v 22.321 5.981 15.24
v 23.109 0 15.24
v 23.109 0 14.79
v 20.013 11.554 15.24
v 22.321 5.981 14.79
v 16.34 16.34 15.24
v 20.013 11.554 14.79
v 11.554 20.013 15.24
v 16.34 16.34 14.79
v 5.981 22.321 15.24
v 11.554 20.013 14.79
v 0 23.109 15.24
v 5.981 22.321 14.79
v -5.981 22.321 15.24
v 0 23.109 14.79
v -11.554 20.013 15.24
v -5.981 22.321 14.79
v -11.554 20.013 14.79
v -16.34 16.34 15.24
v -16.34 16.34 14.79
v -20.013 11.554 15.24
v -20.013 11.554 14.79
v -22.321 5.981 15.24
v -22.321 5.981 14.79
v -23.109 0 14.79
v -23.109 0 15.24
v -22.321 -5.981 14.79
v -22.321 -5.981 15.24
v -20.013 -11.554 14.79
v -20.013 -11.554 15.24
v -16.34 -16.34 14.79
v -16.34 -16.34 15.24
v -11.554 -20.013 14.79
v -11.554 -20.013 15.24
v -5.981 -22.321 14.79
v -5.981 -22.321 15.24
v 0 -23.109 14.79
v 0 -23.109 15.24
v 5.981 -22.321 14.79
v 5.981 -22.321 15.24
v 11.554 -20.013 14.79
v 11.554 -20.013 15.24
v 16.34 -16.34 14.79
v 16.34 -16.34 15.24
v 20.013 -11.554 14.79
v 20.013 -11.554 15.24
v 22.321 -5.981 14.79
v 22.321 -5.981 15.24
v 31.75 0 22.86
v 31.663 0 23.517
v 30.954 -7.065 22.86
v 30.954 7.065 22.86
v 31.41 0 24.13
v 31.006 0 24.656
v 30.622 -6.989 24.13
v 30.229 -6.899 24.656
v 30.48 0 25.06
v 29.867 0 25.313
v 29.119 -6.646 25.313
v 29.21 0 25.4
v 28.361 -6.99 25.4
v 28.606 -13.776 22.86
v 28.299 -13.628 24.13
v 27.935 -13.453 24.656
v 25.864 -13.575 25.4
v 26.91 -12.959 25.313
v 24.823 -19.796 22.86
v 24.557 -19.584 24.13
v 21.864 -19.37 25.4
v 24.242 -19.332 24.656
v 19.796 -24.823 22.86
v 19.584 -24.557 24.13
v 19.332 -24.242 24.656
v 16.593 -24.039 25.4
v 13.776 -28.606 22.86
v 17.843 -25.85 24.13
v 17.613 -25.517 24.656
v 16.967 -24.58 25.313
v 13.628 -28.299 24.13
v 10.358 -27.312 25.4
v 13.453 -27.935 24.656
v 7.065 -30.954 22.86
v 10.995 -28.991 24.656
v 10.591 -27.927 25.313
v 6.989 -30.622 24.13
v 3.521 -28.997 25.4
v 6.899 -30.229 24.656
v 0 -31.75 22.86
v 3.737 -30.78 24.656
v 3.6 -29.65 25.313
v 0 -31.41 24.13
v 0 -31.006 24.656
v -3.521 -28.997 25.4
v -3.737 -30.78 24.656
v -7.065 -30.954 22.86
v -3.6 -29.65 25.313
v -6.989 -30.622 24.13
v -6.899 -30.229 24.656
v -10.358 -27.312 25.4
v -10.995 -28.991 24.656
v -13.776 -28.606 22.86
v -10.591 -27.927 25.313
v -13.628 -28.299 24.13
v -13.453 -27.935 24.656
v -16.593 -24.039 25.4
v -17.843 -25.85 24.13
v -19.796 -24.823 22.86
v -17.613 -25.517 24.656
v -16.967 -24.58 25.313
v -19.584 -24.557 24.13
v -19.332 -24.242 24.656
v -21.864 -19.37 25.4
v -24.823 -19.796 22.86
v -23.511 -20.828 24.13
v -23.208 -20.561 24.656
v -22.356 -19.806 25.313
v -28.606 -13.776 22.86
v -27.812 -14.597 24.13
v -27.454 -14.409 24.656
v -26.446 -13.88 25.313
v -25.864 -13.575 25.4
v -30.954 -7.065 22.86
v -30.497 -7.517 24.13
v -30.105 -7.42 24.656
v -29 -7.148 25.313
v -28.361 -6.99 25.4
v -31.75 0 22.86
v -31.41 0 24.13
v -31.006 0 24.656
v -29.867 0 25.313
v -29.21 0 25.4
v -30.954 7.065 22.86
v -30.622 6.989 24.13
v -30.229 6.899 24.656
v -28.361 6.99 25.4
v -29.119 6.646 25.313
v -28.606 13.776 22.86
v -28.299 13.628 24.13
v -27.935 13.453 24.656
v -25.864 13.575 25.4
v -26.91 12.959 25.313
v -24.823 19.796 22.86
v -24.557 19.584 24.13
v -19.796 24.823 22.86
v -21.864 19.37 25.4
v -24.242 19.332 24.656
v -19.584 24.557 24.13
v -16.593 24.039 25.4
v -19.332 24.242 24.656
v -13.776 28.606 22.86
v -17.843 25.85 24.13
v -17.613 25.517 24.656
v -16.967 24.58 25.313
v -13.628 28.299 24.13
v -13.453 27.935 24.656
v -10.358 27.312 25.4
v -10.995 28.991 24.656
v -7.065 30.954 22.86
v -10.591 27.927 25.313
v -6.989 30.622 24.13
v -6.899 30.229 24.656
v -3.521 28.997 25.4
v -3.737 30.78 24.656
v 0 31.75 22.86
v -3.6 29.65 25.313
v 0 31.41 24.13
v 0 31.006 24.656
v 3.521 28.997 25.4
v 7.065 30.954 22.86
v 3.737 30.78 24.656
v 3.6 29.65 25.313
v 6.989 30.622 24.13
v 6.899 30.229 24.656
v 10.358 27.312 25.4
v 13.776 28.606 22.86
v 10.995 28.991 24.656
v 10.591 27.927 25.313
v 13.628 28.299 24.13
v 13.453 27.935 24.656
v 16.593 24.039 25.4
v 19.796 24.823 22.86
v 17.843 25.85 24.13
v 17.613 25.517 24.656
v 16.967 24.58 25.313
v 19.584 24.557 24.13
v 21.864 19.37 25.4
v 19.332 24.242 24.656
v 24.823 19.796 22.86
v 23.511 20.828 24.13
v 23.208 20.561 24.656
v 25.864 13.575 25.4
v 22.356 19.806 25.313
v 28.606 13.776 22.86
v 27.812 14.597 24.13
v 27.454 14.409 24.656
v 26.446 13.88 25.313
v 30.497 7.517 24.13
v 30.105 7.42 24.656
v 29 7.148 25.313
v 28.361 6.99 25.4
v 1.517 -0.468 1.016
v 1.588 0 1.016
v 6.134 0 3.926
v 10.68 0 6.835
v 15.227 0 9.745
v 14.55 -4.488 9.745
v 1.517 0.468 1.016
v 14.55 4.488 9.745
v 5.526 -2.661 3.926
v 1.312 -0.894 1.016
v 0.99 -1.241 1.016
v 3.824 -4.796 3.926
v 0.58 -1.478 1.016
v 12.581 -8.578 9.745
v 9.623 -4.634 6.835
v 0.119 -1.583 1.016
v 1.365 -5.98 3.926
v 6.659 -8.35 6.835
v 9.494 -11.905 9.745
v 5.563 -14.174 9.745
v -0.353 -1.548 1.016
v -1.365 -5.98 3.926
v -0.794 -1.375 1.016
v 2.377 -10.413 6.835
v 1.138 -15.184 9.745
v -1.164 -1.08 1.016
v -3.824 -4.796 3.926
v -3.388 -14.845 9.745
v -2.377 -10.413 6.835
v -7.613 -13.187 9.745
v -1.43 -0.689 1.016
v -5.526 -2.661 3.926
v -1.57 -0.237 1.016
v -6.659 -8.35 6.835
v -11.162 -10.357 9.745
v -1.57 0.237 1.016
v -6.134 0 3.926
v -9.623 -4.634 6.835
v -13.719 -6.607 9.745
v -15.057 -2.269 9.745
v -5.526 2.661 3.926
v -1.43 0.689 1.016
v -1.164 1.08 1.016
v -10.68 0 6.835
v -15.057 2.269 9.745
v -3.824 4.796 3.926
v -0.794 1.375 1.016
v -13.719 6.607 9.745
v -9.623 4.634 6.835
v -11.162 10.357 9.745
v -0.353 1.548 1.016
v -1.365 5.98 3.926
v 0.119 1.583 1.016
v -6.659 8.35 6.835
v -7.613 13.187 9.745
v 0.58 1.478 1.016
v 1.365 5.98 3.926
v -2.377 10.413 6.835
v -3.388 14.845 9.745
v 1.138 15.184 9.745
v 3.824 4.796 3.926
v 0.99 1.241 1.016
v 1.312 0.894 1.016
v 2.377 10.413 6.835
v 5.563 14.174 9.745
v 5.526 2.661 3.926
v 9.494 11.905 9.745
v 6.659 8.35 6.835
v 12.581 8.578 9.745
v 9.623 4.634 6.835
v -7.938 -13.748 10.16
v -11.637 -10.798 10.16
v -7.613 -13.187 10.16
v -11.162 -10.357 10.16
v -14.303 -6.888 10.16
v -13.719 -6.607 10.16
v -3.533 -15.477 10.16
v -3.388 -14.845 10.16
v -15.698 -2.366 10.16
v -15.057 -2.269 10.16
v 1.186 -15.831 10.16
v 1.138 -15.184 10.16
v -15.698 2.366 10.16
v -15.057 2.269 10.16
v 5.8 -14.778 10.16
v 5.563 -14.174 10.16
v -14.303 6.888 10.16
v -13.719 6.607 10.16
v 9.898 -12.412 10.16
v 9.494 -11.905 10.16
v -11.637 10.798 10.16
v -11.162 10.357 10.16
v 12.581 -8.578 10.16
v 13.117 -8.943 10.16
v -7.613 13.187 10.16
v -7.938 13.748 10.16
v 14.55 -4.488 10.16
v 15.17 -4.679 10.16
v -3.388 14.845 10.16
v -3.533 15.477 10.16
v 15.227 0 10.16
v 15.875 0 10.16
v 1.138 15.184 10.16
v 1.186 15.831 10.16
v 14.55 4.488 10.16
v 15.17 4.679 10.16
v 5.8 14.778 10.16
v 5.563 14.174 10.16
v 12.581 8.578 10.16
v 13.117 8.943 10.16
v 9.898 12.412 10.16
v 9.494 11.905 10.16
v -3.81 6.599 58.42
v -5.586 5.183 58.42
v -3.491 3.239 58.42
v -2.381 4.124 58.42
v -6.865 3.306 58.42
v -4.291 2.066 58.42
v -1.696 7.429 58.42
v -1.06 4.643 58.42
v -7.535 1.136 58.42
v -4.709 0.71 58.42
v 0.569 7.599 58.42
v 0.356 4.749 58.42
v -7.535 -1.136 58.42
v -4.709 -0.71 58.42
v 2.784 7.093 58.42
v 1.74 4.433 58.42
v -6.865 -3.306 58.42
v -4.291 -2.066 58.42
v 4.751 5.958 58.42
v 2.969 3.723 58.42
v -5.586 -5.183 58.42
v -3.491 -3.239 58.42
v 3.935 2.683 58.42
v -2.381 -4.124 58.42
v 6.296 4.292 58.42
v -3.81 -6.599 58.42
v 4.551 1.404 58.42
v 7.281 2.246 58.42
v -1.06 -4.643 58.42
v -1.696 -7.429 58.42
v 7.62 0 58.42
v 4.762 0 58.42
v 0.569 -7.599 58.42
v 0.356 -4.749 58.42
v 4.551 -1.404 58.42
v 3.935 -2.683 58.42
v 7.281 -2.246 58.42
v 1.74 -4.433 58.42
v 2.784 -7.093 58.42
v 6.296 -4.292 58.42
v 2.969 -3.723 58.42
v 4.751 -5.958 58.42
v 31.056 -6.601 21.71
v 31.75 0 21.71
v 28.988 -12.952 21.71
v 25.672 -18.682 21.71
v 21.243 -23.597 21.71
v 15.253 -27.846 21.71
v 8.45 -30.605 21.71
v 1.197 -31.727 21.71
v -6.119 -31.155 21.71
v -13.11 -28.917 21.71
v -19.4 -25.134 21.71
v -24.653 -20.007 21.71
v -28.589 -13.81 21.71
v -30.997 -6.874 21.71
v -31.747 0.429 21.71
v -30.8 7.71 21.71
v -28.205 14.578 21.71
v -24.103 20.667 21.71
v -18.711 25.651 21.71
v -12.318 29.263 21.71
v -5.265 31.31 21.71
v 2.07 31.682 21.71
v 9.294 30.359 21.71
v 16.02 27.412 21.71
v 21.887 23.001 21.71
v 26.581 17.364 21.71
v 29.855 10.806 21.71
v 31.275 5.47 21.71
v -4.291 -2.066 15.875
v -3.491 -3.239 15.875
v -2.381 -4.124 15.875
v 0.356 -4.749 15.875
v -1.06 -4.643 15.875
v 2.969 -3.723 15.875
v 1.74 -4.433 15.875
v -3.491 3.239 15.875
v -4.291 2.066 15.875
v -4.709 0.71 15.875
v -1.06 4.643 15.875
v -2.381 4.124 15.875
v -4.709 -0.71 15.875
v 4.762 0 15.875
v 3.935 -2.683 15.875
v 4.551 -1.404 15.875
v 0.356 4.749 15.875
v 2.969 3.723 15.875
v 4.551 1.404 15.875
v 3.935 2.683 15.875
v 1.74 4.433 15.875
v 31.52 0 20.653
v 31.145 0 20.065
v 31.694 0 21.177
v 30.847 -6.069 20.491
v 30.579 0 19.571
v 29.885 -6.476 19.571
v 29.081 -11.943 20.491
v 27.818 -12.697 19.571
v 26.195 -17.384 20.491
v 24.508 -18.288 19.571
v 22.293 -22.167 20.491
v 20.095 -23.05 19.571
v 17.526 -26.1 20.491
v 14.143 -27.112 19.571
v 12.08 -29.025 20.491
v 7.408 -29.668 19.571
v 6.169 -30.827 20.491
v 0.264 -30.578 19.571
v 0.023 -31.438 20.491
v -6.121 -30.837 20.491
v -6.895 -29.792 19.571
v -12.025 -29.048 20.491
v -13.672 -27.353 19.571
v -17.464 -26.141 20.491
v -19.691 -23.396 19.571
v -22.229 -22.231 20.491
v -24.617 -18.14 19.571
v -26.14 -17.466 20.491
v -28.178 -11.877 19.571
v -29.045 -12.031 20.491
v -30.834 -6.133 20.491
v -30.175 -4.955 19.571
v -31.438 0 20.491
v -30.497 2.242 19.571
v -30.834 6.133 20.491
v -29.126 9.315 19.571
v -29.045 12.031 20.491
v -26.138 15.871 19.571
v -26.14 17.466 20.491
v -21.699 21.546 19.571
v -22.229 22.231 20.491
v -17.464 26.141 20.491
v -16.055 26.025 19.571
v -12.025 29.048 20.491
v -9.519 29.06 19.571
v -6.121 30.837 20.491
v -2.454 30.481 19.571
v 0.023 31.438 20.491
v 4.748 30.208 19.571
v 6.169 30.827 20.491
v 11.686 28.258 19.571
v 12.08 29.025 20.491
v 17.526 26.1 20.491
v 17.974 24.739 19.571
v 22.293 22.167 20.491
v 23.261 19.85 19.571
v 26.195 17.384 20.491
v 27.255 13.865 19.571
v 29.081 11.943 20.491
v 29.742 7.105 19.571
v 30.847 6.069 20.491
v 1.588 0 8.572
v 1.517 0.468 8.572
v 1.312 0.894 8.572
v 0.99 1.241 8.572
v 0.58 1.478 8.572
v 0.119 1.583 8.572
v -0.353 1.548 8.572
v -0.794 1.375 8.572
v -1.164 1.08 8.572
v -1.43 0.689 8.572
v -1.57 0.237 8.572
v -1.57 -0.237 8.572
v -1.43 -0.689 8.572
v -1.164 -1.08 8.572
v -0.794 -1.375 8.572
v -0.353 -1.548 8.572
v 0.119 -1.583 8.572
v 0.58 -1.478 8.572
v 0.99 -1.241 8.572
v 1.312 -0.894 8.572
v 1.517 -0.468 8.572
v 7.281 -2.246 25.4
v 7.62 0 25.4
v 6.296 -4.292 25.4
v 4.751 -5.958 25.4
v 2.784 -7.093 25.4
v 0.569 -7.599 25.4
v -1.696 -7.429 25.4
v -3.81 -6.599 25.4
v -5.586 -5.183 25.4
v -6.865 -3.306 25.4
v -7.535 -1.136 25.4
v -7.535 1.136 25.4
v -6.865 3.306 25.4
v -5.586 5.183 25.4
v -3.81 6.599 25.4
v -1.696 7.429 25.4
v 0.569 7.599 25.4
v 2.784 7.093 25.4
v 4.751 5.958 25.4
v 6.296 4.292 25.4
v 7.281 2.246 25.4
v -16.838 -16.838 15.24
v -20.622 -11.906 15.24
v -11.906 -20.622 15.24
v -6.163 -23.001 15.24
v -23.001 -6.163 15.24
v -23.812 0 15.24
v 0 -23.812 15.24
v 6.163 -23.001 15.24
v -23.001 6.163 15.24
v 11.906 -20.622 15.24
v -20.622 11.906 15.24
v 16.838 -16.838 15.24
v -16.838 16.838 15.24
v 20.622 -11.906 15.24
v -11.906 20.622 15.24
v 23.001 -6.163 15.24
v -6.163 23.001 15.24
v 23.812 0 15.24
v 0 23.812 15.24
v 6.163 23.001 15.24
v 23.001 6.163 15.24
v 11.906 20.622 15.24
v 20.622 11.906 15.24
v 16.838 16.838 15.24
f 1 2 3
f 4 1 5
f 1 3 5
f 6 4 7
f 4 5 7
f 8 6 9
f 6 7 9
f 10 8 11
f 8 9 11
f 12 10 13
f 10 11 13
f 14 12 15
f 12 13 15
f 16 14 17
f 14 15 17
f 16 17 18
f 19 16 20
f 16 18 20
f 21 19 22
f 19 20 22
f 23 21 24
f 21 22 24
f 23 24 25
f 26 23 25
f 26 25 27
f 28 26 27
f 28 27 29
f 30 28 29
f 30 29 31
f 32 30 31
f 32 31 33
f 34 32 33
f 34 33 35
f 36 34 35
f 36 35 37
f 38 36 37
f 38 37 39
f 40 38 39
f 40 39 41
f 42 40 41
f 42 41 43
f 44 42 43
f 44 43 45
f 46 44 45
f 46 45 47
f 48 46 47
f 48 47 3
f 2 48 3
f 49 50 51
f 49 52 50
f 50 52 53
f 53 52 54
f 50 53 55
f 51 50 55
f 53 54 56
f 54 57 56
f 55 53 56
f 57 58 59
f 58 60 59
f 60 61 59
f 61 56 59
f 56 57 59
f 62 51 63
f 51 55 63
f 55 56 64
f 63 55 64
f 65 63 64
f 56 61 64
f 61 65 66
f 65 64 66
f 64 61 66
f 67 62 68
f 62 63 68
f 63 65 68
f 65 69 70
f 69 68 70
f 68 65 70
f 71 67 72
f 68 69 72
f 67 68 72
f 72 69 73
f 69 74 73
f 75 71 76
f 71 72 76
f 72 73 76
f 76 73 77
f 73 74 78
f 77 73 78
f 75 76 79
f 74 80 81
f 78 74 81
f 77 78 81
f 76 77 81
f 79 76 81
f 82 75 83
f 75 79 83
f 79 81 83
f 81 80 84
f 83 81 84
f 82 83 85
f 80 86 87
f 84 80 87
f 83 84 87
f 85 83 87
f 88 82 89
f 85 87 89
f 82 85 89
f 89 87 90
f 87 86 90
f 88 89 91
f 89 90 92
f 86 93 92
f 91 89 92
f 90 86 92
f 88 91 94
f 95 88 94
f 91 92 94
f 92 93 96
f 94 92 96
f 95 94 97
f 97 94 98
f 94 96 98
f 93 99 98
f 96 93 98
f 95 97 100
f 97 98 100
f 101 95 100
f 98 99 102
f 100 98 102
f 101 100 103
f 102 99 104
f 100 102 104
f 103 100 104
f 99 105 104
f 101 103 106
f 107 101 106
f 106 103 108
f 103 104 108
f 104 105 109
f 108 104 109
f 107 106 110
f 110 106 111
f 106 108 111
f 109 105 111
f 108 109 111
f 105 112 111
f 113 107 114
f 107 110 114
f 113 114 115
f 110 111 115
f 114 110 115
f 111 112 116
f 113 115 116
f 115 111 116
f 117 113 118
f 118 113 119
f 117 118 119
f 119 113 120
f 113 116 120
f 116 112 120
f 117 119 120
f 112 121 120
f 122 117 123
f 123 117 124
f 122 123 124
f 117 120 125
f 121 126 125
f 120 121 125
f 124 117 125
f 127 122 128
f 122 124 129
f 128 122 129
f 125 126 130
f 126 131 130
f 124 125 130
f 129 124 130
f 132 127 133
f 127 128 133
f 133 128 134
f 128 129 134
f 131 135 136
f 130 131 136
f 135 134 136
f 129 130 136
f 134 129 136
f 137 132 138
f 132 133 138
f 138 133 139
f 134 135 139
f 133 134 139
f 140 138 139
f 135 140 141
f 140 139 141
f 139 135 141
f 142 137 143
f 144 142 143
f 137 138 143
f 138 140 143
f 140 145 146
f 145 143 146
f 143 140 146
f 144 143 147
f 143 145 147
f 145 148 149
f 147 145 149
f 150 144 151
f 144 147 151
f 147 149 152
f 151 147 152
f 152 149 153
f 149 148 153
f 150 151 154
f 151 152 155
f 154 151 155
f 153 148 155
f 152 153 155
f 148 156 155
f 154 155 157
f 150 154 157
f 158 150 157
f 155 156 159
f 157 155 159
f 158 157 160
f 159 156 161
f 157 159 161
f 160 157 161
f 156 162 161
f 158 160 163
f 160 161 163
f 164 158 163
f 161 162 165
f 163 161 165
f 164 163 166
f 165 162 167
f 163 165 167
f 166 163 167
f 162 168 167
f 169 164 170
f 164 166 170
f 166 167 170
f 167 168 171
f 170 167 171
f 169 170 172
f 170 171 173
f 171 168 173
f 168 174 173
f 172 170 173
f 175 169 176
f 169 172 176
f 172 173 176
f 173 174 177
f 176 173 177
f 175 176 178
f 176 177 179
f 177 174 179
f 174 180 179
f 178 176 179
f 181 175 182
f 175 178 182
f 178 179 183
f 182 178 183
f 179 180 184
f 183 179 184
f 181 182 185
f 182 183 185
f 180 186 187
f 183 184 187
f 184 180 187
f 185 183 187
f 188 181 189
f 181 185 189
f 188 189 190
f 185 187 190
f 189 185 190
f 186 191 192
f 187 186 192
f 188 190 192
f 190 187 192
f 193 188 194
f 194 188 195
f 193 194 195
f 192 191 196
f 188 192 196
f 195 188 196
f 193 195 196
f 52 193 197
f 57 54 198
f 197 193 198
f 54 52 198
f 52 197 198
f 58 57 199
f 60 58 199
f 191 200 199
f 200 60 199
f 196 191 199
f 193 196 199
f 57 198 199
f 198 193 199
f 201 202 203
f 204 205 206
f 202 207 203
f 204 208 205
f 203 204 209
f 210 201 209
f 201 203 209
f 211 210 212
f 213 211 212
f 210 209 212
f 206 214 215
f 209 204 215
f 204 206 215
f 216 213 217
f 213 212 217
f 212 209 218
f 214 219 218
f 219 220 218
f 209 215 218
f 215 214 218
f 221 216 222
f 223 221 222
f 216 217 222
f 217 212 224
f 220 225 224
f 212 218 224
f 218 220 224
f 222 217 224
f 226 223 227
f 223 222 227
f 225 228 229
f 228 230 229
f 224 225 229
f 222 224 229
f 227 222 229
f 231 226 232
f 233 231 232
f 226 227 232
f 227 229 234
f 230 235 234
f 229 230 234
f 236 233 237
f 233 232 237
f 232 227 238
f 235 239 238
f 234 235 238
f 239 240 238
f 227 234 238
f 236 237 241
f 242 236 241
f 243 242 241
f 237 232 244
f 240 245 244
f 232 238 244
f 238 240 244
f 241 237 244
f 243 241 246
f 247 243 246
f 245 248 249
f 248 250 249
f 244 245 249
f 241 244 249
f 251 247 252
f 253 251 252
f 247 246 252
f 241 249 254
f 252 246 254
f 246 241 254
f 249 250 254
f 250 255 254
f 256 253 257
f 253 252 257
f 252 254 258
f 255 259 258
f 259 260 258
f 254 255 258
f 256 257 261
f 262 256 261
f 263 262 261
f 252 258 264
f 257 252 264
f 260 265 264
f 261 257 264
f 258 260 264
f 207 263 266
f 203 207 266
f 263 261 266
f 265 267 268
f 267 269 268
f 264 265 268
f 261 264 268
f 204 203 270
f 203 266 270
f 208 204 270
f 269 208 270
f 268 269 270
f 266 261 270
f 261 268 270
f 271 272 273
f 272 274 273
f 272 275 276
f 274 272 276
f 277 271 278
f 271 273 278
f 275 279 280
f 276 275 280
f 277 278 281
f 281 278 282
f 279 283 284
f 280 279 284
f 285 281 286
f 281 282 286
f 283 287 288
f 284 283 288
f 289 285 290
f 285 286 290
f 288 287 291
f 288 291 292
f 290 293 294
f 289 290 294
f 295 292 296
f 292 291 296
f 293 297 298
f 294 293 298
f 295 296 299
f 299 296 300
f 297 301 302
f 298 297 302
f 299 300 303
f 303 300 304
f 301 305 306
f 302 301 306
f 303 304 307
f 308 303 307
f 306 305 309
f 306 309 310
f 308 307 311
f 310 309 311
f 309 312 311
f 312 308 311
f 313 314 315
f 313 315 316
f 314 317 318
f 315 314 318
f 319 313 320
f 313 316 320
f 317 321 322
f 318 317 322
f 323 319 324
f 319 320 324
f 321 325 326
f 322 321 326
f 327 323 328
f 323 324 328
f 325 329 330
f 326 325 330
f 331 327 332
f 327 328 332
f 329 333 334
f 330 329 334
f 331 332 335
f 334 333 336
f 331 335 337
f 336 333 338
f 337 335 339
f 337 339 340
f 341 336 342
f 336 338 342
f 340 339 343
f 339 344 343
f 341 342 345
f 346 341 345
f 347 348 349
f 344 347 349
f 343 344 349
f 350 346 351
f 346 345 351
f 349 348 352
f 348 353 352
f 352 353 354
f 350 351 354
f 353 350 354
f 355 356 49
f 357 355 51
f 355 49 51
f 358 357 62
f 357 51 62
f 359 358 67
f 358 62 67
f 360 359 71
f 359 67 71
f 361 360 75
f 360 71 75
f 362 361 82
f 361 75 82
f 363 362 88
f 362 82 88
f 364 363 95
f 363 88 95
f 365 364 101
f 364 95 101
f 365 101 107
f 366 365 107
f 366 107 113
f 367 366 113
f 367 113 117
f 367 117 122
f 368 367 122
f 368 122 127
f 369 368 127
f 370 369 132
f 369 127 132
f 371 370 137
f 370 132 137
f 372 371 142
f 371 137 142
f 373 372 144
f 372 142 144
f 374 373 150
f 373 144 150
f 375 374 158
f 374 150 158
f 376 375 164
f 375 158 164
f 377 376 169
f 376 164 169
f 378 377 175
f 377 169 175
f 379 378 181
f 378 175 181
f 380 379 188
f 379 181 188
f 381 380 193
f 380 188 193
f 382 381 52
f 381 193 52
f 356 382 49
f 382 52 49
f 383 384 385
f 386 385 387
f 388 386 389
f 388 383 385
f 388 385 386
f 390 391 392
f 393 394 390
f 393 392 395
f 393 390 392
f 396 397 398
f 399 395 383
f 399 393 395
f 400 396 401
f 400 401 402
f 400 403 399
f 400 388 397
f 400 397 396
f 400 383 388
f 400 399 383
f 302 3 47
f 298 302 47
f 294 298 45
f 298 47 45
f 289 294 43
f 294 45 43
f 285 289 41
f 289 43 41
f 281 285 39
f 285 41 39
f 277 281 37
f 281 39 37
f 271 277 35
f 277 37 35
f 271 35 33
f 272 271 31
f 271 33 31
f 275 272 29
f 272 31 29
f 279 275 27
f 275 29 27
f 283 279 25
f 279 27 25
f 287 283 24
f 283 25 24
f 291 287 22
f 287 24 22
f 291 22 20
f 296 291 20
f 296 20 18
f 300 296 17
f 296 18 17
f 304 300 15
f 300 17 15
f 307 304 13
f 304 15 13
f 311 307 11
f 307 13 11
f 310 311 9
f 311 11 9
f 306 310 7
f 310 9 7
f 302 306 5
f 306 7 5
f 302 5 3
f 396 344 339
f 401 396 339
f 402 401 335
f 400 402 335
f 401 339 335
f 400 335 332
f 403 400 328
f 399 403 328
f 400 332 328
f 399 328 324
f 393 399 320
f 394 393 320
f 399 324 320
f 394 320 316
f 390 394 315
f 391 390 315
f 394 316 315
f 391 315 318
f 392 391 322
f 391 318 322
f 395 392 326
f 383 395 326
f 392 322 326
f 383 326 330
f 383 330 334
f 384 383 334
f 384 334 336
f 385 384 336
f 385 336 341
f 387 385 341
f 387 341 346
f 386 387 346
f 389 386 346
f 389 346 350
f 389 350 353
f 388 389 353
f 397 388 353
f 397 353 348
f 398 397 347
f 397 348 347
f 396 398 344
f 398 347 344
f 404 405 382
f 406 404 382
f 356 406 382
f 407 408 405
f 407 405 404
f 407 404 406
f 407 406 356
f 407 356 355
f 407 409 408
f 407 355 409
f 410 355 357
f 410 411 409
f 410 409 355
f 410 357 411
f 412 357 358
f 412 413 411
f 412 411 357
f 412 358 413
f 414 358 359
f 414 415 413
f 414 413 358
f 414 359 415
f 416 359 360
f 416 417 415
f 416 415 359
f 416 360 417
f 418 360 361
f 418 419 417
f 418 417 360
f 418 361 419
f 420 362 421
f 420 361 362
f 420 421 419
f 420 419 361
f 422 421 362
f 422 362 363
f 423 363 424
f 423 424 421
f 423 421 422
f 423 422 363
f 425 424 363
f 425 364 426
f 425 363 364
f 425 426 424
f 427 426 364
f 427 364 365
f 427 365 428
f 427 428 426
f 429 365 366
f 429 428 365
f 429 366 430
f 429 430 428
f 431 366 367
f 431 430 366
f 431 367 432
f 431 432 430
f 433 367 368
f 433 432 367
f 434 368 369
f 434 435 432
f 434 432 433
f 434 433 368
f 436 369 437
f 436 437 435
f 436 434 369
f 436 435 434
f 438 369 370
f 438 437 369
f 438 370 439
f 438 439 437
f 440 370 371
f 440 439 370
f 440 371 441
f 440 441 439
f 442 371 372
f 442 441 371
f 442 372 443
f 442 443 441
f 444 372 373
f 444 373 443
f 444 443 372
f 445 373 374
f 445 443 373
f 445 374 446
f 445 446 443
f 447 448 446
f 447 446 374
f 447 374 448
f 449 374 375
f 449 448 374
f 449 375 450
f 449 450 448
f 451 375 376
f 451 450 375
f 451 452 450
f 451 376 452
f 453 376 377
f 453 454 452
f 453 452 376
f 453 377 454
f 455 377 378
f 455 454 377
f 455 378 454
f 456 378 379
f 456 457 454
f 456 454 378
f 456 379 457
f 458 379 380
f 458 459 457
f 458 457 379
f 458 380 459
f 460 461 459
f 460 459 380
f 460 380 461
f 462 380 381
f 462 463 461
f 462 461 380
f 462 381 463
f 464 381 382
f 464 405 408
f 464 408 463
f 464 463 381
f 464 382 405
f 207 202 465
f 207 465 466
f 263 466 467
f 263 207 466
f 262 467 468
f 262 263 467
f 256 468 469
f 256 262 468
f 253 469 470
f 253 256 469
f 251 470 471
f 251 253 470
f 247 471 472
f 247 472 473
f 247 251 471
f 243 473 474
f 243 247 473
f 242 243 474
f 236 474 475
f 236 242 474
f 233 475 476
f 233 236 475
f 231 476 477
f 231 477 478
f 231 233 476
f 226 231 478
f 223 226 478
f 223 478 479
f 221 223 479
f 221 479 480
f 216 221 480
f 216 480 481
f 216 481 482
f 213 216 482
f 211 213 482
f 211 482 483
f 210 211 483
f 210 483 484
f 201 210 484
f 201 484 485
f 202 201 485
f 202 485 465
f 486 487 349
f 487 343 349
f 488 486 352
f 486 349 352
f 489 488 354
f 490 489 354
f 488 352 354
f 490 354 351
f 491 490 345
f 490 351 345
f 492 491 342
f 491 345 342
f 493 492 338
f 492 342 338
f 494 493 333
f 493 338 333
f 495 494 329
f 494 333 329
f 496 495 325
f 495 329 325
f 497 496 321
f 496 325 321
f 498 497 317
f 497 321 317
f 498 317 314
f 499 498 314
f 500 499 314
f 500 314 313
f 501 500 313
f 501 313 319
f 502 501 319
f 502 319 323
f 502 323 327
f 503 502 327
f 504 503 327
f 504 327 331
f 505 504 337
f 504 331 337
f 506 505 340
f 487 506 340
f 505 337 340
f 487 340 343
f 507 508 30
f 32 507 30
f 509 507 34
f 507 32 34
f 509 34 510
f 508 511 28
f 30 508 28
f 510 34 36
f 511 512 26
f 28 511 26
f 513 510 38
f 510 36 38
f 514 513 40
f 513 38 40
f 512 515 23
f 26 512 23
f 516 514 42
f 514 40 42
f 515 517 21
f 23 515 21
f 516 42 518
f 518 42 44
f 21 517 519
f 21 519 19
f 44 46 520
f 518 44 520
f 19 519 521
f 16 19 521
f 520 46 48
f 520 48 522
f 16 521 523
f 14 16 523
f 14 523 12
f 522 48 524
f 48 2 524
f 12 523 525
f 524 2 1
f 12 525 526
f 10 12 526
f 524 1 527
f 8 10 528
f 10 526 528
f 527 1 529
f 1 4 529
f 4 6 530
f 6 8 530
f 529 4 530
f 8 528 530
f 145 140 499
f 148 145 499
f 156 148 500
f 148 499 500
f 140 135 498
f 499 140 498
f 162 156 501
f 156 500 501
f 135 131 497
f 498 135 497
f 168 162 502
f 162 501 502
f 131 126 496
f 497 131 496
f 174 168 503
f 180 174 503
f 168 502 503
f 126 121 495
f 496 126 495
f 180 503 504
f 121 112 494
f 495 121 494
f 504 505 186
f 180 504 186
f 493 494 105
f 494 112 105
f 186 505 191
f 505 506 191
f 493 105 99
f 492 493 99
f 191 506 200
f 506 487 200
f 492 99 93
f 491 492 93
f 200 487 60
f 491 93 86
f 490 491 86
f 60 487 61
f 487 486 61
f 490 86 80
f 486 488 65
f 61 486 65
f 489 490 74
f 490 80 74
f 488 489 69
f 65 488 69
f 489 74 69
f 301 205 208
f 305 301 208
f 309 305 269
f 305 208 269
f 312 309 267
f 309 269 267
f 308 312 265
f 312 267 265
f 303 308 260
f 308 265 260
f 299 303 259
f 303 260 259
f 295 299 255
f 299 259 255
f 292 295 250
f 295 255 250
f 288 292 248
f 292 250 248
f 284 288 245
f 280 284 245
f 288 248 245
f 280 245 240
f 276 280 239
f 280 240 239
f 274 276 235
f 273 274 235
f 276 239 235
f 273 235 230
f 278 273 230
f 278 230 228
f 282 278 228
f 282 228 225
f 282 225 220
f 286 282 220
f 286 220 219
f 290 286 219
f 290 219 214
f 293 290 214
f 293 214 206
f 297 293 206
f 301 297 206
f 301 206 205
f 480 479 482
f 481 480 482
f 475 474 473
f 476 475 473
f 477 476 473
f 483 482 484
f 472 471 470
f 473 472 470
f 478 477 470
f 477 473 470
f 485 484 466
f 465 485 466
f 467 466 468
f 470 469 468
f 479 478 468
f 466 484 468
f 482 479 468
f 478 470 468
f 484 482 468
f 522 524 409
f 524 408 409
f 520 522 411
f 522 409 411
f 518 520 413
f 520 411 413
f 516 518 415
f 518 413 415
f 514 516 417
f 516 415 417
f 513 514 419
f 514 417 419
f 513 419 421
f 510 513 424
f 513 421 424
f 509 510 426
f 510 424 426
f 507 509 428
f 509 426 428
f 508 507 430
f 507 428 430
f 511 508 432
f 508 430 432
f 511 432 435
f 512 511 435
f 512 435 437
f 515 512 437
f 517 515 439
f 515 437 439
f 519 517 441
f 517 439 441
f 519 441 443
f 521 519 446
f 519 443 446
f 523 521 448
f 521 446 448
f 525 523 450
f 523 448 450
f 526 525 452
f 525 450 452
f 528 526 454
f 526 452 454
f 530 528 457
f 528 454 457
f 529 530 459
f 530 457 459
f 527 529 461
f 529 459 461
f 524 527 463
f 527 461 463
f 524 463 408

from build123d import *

# Parameters (mm, degrees)
F2_R      = 2.54
F3_R      = 1.5875
F4_DEPTH  = 8.5725
F5_R      = 4.7625
F6_DEPTH  = 42.545
F7_R      = 17.565268
F7_R_2    = 15.226775
F8_DEPTH  = 10.16
F9_R      = 24.251391
F9_R_2    = 23.10866
F10_DEPTH = 15.24


with BuildPart() as f1:
    # F0 (on Front) → F1 (revolve)
    with BuildSketch(Plane.XZ):
        Polygon((0, 58.42), (0, 0), (31.75, 20.32), (31.75, 25.4), (7.62, 25.4), (7.62, 58.42), align=None)
    revolve(axis=Axis((0, 0, 29.21), (0, 0, -1)))

    # F2
    f2_edges = [f1.edges().sort_by_distance(p)[0] for p in [
        (-31.75, 0, 20.32),
        (-31.75, 0, 25.4),
        (31.75, 0, 22.86),
    ]]
    fillet(f2_edges, radius=F2_R)

    # F3 (on Top) → F4 (cut)
    with BuildSketch(Plane.XY):
        Circle(F3_R)
    extrude(amount=F4_DEPTH, mode=Mode.SUBTRACT)

    # F5 (on face) → F6 (cut)
    with BuildSketch(Plane.XY.offset(58.42)):
        Circle(F5_R)
    extrude(amount=-F6_DEPTH, mode=Mode.SUBTRACT)

    # F7 (on Top) → F8 (cut)
    with BuildSketch(Plane.XY):
        Circle(F7_R)
        Circle(F7_R_2, mode=Mode.SUBTRACT)
    extrude(amount=F8_DEPTH, mode=Mode.SUBTRACT)

    # F9 (on Top) → F10 (cut)
    with BuildSketch(Plane.XY):
        Circle(F9_R)
        Circle(F9_R_2, mode=Mode.SUBTRACT)
    extrude(amount=F10_DEPTH, mode=Mode.SUBTRACT)


solid = f1.part
